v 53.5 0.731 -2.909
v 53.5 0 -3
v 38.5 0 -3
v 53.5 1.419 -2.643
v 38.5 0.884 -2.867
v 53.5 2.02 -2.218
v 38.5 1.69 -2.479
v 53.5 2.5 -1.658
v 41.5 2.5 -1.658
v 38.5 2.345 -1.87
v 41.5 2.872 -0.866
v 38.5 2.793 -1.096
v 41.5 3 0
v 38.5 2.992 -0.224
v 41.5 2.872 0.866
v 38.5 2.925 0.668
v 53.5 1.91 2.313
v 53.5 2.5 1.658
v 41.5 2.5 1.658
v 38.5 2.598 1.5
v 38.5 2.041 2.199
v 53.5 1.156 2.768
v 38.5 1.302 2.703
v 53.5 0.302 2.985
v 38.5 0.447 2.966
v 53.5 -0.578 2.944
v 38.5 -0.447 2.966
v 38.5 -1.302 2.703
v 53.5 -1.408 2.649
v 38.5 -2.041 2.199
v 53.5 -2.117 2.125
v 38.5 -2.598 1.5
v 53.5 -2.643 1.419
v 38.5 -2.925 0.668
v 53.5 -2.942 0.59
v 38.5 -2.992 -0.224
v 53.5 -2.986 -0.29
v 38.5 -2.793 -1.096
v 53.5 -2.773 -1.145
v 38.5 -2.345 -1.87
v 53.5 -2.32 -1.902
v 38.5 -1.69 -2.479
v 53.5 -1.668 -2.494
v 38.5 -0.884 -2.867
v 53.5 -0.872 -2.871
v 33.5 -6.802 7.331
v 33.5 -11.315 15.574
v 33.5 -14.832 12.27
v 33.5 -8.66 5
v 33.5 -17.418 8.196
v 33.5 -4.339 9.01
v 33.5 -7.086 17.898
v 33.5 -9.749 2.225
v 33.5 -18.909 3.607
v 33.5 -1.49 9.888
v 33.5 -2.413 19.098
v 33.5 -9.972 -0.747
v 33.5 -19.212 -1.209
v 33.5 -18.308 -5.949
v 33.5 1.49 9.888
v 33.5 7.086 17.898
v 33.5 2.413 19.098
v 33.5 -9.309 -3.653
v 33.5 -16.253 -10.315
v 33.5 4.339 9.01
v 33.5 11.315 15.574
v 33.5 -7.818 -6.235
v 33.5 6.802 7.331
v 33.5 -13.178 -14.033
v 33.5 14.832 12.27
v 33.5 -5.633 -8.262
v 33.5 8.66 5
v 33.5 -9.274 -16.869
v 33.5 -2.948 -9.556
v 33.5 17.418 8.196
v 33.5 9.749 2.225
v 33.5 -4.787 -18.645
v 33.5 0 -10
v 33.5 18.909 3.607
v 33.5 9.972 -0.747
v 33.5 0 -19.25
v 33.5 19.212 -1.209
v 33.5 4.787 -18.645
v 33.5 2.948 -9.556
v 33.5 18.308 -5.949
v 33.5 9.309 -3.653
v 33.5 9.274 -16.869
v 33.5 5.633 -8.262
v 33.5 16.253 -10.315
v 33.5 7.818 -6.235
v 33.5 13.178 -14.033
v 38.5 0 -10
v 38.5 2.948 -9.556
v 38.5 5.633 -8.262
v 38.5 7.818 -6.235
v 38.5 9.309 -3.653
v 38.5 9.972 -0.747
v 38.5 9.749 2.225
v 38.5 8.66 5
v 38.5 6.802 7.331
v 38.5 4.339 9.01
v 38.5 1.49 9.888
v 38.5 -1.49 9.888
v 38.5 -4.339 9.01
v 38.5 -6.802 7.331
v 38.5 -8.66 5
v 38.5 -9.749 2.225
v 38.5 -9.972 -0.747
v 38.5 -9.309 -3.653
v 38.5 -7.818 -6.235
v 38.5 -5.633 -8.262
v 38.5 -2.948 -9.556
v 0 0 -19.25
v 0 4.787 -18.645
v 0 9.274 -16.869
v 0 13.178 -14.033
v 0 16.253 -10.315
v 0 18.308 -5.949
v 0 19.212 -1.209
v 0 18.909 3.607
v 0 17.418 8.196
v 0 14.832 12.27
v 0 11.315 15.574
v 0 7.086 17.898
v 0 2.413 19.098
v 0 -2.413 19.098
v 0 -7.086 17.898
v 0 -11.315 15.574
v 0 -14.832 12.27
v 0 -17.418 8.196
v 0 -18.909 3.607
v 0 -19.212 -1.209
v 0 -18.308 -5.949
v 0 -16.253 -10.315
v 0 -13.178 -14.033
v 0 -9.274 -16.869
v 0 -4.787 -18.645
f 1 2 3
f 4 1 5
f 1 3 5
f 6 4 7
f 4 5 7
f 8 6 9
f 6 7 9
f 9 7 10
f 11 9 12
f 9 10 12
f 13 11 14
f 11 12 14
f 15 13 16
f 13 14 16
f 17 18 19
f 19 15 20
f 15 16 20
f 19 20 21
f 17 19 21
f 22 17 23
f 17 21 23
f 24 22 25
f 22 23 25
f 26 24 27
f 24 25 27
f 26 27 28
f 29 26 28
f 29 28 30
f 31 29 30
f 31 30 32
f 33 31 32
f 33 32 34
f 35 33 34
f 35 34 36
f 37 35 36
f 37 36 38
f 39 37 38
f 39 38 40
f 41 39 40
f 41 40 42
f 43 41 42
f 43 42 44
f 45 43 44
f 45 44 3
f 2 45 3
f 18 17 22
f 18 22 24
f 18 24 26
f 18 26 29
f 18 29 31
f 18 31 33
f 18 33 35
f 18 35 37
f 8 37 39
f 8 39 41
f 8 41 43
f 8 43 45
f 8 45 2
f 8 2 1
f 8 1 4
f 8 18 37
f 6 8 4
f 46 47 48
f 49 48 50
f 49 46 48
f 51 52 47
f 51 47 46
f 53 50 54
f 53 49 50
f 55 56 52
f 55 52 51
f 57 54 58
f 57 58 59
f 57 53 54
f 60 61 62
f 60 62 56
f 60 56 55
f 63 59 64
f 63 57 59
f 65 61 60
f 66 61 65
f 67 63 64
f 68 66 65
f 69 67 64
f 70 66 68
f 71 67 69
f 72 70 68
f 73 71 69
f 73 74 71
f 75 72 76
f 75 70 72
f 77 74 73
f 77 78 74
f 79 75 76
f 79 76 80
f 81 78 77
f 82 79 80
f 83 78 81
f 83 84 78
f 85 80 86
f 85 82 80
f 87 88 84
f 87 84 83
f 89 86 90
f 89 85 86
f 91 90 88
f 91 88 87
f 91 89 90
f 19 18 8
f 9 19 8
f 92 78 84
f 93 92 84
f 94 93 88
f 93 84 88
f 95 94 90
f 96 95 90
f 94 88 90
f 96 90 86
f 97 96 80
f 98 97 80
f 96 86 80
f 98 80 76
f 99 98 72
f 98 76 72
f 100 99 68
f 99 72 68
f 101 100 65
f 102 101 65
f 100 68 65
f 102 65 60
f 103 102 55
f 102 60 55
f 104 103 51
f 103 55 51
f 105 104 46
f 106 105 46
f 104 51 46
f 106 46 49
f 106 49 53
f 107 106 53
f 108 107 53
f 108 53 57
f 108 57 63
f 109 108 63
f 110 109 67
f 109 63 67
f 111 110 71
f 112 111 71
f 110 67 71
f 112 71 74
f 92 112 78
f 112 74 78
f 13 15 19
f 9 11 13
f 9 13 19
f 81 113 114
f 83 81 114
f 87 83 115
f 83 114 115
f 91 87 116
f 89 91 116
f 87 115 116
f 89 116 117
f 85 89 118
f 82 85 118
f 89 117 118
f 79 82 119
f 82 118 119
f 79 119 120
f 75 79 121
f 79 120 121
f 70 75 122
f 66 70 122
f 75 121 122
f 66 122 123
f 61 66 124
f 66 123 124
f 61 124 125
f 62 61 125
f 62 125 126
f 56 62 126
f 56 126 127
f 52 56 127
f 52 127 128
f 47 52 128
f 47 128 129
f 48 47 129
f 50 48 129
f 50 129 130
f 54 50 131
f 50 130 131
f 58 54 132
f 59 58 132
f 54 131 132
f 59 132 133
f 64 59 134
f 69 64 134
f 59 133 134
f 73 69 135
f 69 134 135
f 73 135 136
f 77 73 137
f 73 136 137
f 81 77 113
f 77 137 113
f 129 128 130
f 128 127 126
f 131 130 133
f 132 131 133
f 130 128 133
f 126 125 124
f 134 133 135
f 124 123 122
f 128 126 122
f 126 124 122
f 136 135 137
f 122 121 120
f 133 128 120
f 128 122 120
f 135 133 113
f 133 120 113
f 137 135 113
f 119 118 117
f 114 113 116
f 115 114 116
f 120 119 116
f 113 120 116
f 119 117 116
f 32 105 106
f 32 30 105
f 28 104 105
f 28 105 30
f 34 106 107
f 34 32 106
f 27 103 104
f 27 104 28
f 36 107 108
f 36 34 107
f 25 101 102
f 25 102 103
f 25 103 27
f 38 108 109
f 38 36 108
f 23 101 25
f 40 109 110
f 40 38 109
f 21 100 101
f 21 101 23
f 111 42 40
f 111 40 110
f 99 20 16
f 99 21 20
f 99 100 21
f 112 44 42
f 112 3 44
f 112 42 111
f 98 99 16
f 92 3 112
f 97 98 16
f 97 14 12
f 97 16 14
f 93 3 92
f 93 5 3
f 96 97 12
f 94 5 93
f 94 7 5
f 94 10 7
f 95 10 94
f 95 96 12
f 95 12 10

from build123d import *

# Parameters (mm, degrees)
ESQUISSE_BASE_CODEUR_R    = 19.25
BASE_CODEUR_DEPTH         = 33.5
ESQUISSE_PLATEAU_CODEUR_R = 10
PLATEAU_CODEUR_DEPTH      = 5
ESQUISSE_ARBRE_R          = 3
ARBRE_DEPTH               = 15
USINAGE_ARBRE_DEPTH       = 12


with BuildPart() as part:
    # esquisse_base_codeur → base_codeur (new body)
    with BuildSketch(Plane(origin=(0, 0, 0), x_dir=(0, 0, -1), z_dir=(1, 0, 0))):
        Circle(ESQUISSE_BASE_CODEUR_R)
    extrude(amount=BASE_CODEUR_DEPTH)

    # esquisse_plateau_codeur → plateau_codeur (add)
    with BuildSketch(Plane(origin=(33.5, 0, 0), x_dir=(0, 0, -1), z_dir=(1, 0, 0))):
        Circle(ESQUISSE_PLATEAU_CODEUR_R)
    extrude(amount=PLATEAU_CODEUR_DEPTH)

    # esquisse_arbre → arbre (add)
    with BuildSketch(Plane(origin=(38.5, 0, 0), x_dir=(0, 0, -1), z_dir=(1, 0, 0))):
        Circle(ESQUISSE_ARBRE_R)
    extrude(amount=ARBRE_DEPTH)

    # esquisse_usinage_arbre → usinage_arbre (cut)
    with BuildSketch(Plane(origin=(53.5, 0, 0), x_dir=(0, 0, -1), z_dir=(1, 0, 0))):
        with BuildLine():
            Line((-1.658312395, 2.5), (1.658312395, 2.5))
            ThreePointArc((1.658312395, 2.5), (0, 3), (-1.658312395, 2.5))
        make_face()
    extrude(amount=-USINAGE_ARBRE_DEPTH, mode=Mode.SUBTRACT)


solid = part.part
